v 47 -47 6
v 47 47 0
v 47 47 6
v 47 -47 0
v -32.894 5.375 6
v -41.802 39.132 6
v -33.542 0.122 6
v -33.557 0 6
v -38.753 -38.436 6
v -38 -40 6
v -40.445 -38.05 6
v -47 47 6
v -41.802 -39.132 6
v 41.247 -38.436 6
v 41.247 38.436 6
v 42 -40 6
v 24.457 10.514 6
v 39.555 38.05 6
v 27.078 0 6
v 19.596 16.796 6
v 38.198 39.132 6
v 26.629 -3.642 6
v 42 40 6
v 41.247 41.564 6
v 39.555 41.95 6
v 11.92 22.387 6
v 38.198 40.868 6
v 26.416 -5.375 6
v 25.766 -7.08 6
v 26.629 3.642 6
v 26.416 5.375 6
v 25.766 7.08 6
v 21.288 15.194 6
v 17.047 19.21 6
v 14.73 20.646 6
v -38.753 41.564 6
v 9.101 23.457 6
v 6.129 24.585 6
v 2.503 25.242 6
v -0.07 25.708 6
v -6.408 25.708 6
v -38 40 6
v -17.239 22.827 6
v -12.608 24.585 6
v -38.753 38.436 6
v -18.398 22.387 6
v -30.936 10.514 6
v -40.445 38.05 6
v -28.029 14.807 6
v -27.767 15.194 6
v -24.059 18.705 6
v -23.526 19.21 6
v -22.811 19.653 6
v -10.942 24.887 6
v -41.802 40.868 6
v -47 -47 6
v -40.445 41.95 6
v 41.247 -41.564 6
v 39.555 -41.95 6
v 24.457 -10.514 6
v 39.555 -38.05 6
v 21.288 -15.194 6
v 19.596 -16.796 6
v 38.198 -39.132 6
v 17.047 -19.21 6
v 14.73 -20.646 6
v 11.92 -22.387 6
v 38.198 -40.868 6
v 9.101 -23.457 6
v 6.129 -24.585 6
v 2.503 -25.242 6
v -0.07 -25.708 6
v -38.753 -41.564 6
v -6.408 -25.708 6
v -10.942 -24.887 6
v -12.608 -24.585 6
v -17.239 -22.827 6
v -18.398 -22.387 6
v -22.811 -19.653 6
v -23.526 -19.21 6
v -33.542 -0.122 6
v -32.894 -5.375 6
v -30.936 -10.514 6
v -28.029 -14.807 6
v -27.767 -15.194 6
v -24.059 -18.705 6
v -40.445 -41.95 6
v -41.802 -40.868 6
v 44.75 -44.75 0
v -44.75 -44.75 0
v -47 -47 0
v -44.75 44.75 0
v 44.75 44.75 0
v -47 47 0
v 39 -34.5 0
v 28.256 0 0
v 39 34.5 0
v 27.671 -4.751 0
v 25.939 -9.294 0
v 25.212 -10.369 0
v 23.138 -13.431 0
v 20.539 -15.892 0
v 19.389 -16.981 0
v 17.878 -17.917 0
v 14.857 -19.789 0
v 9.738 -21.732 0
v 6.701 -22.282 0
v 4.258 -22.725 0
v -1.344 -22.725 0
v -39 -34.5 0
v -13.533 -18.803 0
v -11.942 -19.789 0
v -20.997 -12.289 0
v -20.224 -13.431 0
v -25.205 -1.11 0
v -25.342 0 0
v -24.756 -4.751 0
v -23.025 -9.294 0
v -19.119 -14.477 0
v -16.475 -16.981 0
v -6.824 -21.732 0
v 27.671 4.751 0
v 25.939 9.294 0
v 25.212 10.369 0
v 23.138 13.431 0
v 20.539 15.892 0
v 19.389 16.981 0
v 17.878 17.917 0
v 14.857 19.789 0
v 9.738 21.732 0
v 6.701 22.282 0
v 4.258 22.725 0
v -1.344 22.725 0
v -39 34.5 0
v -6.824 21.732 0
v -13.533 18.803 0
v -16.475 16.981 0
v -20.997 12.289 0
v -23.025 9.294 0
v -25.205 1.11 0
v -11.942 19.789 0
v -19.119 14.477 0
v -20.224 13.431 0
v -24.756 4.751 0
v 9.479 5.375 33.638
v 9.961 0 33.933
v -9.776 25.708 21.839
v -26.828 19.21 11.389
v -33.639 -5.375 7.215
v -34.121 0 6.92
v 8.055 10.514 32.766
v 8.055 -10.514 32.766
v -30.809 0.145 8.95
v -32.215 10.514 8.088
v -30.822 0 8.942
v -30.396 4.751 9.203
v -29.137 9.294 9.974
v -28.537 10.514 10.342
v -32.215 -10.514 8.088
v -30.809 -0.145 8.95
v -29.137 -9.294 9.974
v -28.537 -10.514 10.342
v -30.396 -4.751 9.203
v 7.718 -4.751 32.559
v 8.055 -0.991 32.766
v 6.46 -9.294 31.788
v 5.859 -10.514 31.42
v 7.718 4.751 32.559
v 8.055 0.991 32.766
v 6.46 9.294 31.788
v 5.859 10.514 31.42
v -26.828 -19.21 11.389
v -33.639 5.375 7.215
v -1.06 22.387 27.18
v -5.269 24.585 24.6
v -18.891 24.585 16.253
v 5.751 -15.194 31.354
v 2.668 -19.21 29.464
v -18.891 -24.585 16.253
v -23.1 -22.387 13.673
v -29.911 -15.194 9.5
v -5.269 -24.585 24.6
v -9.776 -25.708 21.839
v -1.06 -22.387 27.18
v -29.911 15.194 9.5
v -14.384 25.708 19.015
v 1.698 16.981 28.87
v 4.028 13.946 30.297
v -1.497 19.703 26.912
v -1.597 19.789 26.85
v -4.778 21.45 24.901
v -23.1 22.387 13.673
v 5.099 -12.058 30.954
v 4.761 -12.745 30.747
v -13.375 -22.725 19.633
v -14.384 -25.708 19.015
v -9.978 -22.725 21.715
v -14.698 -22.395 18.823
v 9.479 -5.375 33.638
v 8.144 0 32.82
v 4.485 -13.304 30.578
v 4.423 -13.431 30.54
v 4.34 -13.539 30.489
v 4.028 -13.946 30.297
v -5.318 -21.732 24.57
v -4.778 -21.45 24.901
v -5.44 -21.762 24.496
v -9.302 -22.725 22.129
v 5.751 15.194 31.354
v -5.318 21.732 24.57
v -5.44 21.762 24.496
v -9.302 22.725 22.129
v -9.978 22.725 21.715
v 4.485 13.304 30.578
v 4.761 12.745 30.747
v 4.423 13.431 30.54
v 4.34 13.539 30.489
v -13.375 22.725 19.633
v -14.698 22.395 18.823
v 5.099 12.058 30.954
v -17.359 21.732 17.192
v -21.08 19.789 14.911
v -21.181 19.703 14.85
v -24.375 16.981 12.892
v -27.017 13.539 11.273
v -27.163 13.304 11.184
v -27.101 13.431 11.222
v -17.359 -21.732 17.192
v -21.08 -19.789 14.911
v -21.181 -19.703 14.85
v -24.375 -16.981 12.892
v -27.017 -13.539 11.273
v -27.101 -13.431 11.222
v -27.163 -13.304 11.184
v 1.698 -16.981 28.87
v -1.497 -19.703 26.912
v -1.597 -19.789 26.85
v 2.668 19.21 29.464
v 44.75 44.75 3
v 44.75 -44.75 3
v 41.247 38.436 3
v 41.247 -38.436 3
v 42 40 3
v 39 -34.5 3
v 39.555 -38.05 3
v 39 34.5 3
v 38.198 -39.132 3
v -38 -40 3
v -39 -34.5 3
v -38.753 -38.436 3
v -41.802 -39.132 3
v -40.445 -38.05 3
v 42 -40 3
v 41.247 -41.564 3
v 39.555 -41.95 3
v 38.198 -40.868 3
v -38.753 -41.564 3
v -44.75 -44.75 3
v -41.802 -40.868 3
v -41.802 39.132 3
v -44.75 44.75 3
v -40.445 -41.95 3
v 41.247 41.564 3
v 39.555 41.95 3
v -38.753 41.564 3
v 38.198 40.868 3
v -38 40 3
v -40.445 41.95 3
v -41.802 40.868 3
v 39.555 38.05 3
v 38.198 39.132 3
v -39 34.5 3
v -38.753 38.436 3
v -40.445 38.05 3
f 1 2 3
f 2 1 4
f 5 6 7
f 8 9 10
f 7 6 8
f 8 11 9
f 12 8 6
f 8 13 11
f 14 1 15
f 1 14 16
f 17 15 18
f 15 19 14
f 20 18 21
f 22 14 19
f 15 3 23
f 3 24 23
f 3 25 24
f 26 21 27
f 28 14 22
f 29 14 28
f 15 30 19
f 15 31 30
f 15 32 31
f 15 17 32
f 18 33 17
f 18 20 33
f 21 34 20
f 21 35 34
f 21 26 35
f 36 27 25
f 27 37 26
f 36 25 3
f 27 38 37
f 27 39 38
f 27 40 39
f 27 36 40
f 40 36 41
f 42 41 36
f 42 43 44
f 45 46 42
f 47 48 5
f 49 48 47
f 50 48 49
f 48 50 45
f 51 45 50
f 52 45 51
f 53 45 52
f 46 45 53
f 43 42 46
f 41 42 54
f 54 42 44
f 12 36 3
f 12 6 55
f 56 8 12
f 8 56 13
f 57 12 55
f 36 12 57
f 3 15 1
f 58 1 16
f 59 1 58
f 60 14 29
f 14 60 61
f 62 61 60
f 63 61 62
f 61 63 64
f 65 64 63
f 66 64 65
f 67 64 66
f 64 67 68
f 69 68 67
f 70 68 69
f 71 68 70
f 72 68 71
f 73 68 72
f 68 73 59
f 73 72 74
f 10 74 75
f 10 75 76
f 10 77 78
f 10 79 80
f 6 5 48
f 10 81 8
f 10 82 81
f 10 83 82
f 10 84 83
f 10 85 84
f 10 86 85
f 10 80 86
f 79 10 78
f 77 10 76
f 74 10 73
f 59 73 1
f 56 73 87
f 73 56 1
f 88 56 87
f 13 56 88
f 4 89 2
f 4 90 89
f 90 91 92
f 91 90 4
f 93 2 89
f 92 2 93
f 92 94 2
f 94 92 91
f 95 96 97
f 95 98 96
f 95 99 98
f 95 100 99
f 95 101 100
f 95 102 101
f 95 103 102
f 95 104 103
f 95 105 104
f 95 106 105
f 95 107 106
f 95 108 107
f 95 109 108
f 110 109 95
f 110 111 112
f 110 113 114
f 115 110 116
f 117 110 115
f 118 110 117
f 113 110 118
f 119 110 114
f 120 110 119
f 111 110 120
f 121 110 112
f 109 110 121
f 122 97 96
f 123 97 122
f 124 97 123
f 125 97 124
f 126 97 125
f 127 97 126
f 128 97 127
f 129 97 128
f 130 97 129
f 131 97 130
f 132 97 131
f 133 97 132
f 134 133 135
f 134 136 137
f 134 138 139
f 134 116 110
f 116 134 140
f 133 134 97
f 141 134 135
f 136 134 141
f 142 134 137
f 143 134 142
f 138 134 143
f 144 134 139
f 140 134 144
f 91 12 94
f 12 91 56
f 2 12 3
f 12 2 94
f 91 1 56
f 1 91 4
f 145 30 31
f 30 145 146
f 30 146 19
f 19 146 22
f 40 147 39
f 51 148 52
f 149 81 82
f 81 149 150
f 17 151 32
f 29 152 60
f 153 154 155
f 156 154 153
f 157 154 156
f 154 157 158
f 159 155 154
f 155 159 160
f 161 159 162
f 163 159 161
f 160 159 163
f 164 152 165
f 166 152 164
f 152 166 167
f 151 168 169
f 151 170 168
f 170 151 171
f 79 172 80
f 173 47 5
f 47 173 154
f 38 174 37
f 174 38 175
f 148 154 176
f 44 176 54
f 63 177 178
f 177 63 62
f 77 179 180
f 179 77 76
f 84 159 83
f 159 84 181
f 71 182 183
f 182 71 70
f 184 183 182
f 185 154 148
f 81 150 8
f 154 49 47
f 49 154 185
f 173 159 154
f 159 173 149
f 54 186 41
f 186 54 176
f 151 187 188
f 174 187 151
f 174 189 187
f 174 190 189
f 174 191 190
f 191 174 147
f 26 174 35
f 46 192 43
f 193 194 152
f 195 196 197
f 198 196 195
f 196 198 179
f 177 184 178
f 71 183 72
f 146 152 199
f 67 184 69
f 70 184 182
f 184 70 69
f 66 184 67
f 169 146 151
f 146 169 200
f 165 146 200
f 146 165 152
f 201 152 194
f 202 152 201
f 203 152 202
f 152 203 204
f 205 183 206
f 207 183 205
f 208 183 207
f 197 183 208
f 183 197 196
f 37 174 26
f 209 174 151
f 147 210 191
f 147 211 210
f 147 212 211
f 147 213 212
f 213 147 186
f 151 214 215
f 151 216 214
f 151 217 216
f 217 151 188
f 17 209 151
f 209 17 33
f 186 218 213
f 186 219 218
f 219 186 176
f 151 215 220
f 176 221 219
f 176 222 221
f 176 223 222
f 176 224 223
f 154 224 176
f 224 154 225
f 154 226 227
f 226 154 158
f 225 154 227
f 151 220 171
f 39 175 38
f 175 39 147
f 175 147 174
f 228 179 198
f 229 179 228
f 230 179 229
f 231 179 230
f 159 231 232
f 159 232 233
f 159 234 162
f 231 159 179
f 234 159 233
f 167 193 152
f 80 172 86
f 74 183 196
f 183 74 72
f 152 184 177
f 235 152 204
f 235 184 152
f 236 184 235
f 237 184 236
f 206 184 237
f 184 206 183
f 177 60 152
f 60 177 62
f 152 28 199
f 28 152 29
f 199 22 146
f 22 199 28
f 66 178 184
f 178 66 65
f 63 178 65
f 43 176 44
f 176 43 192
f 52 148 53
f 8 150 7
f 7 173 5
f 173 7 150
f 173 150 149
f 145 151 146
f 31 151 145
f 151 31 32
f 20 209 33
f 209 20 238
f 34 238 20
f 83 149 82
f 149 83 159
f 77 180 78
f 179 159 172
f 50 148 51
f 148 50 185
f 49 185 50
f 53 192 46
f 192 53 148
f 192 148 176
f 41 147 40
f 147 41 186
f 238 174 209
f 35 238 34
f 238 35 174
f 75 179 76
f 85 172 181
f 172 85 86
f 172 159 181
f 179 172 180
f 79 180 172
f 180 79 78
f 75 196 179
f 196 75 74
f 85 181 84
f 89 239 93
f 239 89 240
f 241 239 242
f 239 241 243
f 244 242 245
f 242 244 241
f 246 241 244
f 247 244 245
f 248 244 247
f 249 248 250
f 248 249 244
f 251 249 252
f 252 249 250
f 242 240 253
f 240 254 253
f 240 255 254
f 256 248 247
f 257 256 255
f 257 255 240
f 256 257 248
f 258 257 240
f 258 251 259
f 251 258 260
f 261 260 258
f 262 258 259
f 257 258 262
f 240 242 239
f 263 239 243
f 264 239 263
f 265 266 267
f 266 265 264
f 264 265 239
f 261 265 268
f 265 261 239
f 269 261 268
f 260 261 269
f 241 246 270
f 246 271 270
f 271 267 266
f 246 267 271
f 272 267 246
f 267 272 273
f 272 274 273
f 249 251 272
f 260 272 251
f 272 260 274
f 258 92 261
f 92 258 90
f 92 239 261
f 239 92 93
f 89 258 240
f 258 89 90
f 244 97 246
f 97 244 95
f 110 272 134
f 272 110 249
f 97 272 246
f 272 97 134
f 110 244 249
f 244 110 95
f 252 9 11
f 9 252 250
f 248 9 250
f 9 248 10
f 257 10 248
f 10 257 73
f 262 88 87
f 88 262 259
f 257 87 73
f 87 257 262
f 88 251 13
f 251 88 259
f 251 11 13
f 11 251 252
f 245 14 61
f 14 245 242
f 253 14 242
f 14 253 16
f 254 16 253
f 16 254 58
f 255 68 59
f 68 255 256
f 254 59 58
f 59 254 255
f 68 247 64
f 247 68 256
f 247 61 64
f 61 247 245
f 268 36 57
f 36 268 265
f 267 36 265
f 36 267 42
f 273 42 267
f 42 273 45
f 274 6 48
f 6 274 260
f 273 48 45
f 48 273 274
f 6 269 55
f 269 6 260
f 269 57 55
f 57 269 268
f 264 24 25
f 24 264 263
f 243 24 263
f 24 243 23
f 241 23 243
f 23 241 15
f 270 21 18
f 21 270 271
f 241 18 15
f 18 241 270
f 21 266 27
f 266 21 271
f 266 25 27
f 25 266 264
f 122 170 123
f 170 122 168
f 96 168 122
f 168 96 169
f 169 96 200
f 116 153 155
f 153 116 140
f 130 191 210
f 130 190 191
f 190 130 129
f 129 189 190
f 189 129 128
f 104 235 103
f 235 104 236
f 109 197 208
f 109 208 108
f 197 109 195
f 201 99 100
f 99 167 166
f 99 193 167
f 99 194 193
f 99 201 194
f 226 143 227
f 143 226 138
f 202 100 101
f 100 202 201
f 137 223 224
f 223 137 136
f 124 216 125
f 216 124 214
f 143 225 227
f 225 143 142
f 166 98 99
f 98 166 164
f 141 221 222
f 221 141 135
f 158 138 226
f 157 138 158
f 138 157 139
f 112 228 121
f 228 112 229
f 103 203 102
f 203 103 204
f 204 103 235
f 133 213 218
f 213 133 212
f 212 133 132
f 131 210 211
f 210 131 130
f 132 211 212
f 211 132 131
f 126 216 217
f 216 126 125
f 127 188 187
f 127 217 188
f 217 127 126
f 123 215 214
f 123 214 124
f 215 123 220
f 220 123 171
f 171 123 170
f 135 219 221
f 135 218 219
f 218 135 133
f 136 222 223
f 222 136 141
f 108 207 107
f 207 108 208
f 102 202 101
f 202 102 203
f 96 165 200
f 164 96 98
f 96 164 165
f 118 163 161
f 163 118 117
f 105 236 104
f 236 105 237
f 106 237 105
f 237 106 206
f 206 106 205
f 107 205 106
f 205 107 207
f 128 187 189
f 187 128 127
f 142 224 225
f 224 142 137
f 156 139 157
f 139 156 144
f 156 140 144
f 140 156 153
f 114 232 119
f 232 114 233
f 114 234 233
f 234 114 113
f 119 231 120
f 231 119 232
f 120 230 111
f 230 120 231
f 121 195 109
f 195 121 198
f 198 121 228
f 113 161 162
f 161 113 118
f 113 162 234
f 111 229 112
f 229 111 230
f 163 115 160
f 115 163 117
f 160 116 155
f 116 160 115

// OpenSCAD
// file: ../../library.scad
module tubo(
	h/*Altura*/,
	w/*Pared*/,
	d/*Diametro*/
){
  difference()
  {
    cylinder(r=(d/2), h);
    translate([0,0,-0.1])
    cylinder(r=(d/2)-(2*w), h+0.2);
  }
}

module huyoMasPared(
	d/*Diametro del hoyo*/,
	w/*Pared*/,
	h/*Altura*/,
){
  difference()
  {
    cylinder(r=((d+(2*w))/2), h);
    translate([0,0,-0.1])
    cylinder(r=(d/2), h+0.2);
  }
}

module cuboMasPared(
    w1, //Largo
    w2, //Ancho
    p1, //Pared
    p2, //Pared
    h   //Alto
)
{    
    difference()
    {
        translate([-(w1+(p1*2))/2,-(w2+(p2*2))/2,0])
        cube([(w1+(p1*2)),(w2+(p2*2)),h]);
        
        translate([-w1/2,-w2/2,-0.2])
        cube([w1,w2,h*2]);
        
    }
    
    
}

soporteW = 0.7;

module soporteCylinder()
{
  difference()
  {
	cylinder(r=radio,altura);

	translate([0,0,-0.1])
	cylinder(r=radio-soporteW,altura+0.2);
  }

  if(true){
  difference()
  {
	cylinder(r=radio+0.75,1);

	translate([0,0,-0.1])
	cylinder(r=radio-0.75,1.25);
  }}

}

module soporteOval()
{
  difference()
  {
	oval(w=ancho, h=largo, height=alto, center = false);

	translate([0,0,-0.1])
	oval(ancho-soporteW, largo, alto+0.2);
  }

  difference()
  {
	oval(w=ancho+1, h=largo+1, height=1, center = false);

	translate([0,0,-0.1])
	oval(w=ancho-1, h=largo-1, height=1.25, center = false);
  }

}


module oval(w,h, height, center = false)
{
  scale([1, h/w, 1]) cylinder(h=height, r=w, center=center);
}
// file: Frame.scad
include <Diffracter.scad>

frameW = 64;
frameH = 53.5;
frameD = 2.5;

slideW = frameW - 9;
slideH = frameH - 10;
slideD = 0.8;

winW = slideW;
winH = slideH - 10;

diffW = winW+5;
diffH = winH+13;


//Activate this to display
if(false)
{
  Frame();
}

module Frame()
{
difference()
{

  //translate([-frameW/2,-frameH/2,0])
  //cube([frameW,frameH,frameD]);

  areaSello();

  translate([-winW/2,-winH/2,-0.5])
  cube([winW,winH,frameD*2]);

  translate([-diffW/2,-diffH/2,frameD-0.8])
  cube([diffW,diffH,2]);

}
}


module areaSello()
{
  //cylinder(r=(raspSellR/2)-1,frameD);

  translate([-(frameW)/2,-(frameH)/2,0])
  cube([frameW,frameH,frameD]);
}
// file: Diffracter.scad
//include <Tapa.scad>
include <../../library.scad>


bigW = 88;
ori = bigW/2;
raspSellR = 59;
tuboH = 140;
H = 18.5;
selloH = 7;
tornR = 2;

huecoPared = 12;
huecoH = 22;
selloHembraRadio=40;

//Activate this to display
if(0)
{
translate([0,0,bigW/2])
rotate([0,90,0])
diffracter();


//soporteCylinder(radio=25.2,altura=3.8);

}


module diffracter(){	

difference(){

//Bloque
translate([-bigW/2,-bigW/2,0])
cube([bigW,bigW,H]);


translate([
						-(bigW-huecoPared)/2,
						-(bigW-huecoPared)/2,
						(huecoH/2)
					])
		cube([
					bigW-huecoPared,
					bigW-huecoPared,
					H-huecoH]
				);


//Diffractador
translate([-37.25,-40,-0.1])
cube([74.5,80,5.6]);

//Macro
translate([0,0,5.4])
cylinder(r=(74.5/2),8.2);

//Sello de raspberry
//translate([0,0,-0.1])
//cylinder(r=(raspSellR/2)+1,2);

//Tubo
//translate([0,0,-0.1])
//cylinder(r=(52/2),200);

//Tornillos abajo
translate([-ori+4,-ori+4,-0.1])
cylinder(r=tornR,20);
translate([ori-4,-ori+4,-0.1])
cylinder(r=tornR,20);
translate([-ori+4,ori-4,-0.1])
cylinder(r=tornR,20);
translate([ori-4,ori-4,-0.1])
cylinder(r=tornR,20);

//Hueco
cylinder(r=35.5,H+1);

//Tornillos caja
translate([0,0,(tuboH/2)-7])
rotate([0,90,0])
tornillosArriba();

//Tornillo tripie
translate([-ori-0.1,0,(tuboH/2)+7])
rotate([0,90,0])
cylinder(r=5/2,5.31);

//Sello hembra
translate([0,0,H-3])
cylinder(r=selloHembraRadio,4);

}

//Sello cobertura
//translate([0,0,H-1])
//huyoMasPared(58,3,3);


}
// main file
include <Diffracter.scad>
include <Frame.scad>
include <../../library.scad>

// 3.15° for every 100 l/mm

angulo = 31.5;

coberW = bigW+6;
coberH = 6;
coberOffset = 0;//Posición del tubo
coberOffset2 = -8;//Altura del tubo (-7)->(-8)
cobeSellH = 4;
cobeSellW1 = 7;
cobeSellW2 = 7;

torrRadio = 2;





//soporteCylinder(radio=29,altura=coberH);	
//soporteOval(ancho=28, largo=25, alto=coberH);
//soporteCylinder(radio=34,altura=coberH);
//frameSello();


difference()
{
createAll();

translate([-100,-100,-200])
cube([200,200,200]);

}

module createAll()
{

difference()
{
areaExterna();

//Tubo Interno
translate([15-coberOffset,0,-14.1+coberOffset2])
rotate([0,-angulo,0])//3.15 cada 100 (antes 40)
cylinder(r=(45.7)/2,52);

//Cuadro de la pared
creaContorno();
translate([-bigW/2,-bigW/2,-40+coberH-6])
cube([bigW,bigW,40]);

//Tornillos
tornPass();

//Contorno
creaContorno();

}

//creaSelloMacho();

}




module creaContorno()
{

 difference()
 {
   translate([-(coberW-4.5)/2,-(coberW-4.5)/2,-3])
   cube([(coberW-4.5),(coberW-4.5),coberH]);

   translate([-(coberW-16)/2,-(coberW-25)/2,-3])
   cube([(coberW-16),(coberW-25),coberH]);
 }

/*
 translate([-(coberW-6)/2,-(coberW-6)/2,-3])
 cube([(coberW-6),8.8,coberH]);

 translate([-(coberW-5)/2,((coberW-5)/2)-8.5,-3])
 cube([(coberW-5),10,coberH]);

 translate([(-(coberW-5)/2),-((coberW-6)/2),-3])
 cube([5.5,(coberW-6),coberH]);

 translate([((coberW-5.5)/2)-5,-((coberW-6)/2),-3])
 cube([5.5,(coberW-6),coberH]);
*/
}



module creaSelloMacho()
{

 translate([0,0,coberH-cobeSellH])
 difference()
 {
  areaSello(frameD=cobeSellH);

  translate([-(frameW-cobeSellW1)/2,-(frameH-cobeSellW2)/2,-0.1])
  cube([frameW-cobeSellW1,frameH-cobeSellW2,cobeSellH+1]);
 }
}

module areaExterna()
{
//Cobertura
translate([-coberW/2,-coberW/2,0])
cube([coberW,coberW,coberH]);

//TuboExterno
translate([13-coberOffset,0,-12.5+coberOffset2])
rotate([0,-angulo,0])/*3.15 cada 100 (antes 40)*/
cylinder(r=(45.7+6)/2,48);
}

module recorteOval()
{
  translate([-0.4,0,-1.9])
  oval(26.8,22.9, 15, center = false);
}

module tornPass()
{
translate([-ori+4,-ori+4,-0.1])
cylinder(r=torrRadio,30);
translate([ori-4,-ori+4,-0.1])
cylinder(r=torrRadio,30);
translate([-ori+4,ori-4,-0.1])
cylinder(r=torrRadio,30);
translate([ori-4,ori-4,-0.1])
cylinder(r=torrRadio,30);
}
